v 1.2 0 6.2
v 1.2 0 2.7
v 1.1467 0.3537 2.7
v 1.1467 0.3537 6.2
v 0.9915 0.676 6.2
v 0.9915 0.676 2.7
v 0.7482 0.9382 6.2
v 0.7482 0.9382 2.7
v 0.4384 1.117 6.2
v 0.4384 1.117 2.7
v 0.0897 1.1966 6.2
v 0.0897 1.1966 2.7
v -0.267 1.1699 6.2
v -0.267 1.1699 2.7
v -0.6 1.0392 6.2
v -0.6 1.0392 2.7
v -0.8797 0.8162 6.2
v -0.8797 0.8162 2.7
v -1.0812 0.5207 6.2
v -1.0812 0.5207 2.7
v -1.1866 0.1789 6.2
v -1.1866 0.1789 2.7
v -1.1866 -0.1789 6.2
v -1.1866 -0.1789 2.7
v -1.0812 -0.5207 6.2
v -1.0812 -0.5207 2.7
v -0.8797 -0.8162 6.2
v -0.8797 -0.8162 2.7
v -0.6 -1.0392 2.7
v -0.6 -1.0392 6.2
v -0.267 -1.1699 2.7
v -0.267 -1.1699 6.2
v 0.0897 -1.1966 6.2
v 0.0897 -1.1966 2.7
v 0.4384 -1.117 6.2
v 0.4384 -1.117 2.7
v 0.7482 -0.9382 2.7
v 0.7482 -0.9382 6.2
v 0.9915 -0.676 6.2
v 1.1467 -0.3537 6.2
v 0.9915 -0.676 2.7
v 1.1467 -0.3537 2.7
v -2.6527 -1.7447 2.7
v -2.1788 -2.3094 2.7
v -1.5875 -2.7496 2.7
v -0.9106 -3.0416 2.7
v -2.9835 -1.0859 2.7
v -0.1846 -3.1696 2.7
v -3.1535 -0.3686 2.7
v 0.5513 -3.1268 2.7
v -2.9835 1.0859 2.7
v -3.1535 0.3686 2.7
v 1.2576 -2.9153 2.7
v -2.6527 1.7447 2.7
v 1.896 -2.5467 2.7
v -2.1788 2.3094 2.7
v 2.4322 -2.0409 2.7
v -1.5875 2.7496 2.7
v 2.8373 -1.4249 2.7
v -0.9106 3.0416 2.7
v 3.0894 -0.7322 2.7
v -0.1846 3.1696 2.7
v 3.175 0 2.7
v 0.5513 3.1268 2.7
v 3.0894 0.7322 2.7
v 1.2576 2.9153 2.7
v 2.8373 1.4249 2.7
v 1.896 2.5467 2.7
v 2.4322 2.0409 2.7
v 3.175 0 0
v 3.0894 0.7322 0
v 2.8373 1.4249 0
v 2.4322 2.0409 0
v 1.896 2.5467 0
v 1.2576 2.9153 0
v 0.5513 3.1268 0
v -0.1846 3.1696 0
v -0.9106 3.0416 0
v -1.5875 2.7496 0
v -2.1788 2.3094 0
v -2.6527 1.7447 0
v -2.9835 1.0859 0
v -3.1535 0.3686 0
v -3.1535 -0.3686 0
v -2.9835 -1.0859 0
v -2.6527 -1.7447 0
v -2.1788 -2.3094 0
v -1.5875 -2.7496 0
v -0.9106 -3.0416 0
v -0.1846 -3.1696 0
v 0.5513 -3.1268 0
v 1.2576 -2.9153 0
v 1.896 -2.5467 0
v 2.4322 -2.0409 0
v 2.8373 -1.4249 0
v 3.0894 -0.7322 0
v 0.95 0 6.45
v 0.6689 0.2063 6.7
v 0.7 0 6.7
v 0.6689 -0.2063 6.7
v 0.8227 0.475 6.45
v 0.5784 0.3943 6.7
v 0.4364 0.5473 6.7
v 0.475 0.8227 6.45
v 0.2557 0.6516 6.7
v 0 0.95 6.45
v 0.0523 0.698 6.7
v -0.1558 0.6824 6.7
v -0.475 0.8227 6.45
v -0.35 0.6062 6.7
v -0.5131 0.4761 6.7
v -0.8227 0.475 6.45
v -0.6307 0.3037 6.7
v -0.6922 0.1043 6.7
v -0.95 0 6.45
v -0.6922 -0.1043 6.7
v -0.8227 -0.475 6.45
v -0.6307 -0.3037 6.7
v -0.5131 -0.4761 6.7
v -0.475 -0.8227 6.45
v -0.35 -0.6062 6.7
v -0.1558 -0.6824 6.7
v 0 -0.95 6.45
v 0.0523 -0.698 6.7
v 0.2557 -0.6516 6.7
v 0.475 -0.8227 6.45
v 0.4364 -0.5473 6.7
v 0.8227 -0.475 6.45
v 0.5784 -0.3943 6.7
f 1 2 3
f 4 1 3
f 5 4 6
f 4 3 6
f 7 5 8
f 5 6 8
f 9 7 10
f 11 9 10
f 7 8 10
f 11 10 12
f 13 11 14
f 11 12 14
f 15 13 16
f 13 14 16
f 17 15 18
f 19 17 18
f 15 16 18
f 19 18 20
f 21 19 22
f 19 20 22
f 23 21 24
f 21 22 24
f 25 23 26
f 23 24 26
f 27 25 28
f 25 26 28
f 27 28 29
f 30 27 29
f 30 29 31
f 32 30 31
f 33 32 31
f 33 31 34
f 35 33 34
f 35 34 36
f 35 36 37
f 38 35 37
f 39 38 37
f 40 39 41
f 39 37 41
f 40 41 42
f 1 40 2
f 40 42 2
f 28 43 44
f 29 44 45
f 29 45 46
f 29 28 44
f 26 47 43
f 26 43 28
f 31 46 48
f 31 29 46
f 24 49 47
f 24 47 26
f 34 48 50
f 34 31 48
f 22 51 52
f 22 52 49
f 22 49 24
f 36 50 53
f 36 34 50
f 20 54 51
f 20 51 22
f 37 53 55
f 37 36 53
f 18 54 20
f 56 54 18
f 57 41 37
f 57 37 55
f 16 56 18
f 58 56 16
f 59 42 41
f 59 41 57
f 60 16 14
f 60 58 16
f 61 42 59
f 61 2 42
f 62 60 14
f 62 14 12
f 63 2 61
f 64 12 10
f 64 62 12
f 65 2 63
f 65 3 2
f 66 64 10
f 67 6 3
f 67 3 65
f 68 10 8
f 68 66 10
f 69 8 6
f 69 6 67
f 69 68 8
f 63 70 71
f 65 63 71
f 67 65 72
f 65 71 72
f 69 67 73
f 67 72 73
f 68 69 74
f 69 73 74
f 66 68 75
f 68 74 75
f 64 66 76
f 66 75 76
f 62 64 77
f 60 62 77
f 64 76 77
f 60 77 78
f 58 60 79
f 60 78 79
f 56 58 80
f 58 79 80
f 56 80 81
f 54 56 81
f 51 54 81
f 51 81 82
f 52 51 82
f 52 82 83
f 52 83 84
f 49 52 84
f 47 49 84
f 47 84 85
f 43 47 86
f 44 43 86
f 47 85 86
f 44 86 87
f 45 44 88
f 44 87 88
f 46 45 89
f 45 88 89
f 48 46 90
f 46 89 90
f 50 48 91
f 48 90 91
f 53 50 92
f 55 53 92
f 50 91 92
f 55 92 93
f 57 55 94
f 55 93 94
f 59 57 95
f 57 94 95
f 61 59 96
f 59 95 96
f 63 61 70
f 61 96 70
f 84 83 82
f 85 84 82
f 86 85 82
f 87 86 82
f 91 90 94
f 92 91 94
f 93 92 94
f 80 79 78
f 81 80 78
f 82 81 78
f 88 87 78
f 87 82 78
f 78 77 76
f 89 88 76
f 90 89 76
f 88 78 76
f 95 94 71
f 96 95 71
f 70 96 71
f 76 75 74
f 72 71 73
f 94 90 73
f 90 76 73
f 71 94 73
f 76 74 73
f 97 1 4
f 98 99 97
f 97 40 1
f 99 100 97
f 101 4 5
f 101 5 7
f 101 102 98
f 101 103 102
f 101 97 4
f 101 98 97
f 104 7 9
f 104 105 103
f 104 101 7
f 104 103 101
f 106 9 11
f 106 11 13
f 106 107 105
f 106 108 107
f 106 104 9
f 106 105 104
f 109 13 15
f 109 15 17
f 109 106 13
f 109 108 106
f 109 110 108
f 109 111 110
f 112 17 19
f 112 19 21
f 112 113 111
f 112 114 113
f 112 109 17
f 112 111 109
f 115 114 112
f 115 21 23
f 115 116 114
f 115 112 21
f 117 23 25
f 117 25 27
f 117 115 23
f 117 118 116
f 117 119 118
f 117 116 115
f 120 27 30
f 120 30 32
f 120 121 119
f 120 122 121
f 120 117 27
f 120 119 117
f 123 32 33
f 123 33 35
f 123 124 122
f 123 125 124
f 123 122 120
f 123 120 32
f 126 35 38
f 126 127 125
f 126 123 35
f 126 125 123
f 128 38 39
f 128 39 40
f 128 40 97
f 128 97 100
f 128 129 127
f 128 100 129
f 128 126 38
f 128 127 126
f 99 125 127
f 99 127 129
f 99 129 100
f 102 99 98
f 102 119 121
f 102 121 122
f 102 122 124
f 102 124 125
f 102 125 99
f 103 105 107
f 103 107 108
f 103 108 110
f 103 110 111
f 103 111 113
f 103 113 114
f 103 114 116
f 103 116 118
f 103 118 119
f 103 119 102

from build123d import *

# Parameters (mm, degrees)
SKETCH_R     = 3.175
PAD_DEPTH    = 2.7
SKETCH001_R  = 1.2
PAD001_DEPTH = 4
CHAMFER_SIZE = 0.5


with BuildPart() as part:
    # Sketch → Pad (new body)
    with BuildSketch(Plane.XY):
        Circle(SKETCH_R)
    extrude(amount=PAD_DEPTH)

    # Sketch001 → Pad001 (new body)
    with BuildSketch(Plane.XY.offset(2.7)):
        Circle(SKETCH001_R)
    extrude(amount=PAD001_DEPTH)

    # Chamfer
    chamfer_edges = [part.edges().sort_by_distance(p)[0] for p in [
        (-1.2, 0, 6.7),
    ]]
    chamfer(chamfer_edges, length=CHAMFER_SIZE)


solid = part.part
